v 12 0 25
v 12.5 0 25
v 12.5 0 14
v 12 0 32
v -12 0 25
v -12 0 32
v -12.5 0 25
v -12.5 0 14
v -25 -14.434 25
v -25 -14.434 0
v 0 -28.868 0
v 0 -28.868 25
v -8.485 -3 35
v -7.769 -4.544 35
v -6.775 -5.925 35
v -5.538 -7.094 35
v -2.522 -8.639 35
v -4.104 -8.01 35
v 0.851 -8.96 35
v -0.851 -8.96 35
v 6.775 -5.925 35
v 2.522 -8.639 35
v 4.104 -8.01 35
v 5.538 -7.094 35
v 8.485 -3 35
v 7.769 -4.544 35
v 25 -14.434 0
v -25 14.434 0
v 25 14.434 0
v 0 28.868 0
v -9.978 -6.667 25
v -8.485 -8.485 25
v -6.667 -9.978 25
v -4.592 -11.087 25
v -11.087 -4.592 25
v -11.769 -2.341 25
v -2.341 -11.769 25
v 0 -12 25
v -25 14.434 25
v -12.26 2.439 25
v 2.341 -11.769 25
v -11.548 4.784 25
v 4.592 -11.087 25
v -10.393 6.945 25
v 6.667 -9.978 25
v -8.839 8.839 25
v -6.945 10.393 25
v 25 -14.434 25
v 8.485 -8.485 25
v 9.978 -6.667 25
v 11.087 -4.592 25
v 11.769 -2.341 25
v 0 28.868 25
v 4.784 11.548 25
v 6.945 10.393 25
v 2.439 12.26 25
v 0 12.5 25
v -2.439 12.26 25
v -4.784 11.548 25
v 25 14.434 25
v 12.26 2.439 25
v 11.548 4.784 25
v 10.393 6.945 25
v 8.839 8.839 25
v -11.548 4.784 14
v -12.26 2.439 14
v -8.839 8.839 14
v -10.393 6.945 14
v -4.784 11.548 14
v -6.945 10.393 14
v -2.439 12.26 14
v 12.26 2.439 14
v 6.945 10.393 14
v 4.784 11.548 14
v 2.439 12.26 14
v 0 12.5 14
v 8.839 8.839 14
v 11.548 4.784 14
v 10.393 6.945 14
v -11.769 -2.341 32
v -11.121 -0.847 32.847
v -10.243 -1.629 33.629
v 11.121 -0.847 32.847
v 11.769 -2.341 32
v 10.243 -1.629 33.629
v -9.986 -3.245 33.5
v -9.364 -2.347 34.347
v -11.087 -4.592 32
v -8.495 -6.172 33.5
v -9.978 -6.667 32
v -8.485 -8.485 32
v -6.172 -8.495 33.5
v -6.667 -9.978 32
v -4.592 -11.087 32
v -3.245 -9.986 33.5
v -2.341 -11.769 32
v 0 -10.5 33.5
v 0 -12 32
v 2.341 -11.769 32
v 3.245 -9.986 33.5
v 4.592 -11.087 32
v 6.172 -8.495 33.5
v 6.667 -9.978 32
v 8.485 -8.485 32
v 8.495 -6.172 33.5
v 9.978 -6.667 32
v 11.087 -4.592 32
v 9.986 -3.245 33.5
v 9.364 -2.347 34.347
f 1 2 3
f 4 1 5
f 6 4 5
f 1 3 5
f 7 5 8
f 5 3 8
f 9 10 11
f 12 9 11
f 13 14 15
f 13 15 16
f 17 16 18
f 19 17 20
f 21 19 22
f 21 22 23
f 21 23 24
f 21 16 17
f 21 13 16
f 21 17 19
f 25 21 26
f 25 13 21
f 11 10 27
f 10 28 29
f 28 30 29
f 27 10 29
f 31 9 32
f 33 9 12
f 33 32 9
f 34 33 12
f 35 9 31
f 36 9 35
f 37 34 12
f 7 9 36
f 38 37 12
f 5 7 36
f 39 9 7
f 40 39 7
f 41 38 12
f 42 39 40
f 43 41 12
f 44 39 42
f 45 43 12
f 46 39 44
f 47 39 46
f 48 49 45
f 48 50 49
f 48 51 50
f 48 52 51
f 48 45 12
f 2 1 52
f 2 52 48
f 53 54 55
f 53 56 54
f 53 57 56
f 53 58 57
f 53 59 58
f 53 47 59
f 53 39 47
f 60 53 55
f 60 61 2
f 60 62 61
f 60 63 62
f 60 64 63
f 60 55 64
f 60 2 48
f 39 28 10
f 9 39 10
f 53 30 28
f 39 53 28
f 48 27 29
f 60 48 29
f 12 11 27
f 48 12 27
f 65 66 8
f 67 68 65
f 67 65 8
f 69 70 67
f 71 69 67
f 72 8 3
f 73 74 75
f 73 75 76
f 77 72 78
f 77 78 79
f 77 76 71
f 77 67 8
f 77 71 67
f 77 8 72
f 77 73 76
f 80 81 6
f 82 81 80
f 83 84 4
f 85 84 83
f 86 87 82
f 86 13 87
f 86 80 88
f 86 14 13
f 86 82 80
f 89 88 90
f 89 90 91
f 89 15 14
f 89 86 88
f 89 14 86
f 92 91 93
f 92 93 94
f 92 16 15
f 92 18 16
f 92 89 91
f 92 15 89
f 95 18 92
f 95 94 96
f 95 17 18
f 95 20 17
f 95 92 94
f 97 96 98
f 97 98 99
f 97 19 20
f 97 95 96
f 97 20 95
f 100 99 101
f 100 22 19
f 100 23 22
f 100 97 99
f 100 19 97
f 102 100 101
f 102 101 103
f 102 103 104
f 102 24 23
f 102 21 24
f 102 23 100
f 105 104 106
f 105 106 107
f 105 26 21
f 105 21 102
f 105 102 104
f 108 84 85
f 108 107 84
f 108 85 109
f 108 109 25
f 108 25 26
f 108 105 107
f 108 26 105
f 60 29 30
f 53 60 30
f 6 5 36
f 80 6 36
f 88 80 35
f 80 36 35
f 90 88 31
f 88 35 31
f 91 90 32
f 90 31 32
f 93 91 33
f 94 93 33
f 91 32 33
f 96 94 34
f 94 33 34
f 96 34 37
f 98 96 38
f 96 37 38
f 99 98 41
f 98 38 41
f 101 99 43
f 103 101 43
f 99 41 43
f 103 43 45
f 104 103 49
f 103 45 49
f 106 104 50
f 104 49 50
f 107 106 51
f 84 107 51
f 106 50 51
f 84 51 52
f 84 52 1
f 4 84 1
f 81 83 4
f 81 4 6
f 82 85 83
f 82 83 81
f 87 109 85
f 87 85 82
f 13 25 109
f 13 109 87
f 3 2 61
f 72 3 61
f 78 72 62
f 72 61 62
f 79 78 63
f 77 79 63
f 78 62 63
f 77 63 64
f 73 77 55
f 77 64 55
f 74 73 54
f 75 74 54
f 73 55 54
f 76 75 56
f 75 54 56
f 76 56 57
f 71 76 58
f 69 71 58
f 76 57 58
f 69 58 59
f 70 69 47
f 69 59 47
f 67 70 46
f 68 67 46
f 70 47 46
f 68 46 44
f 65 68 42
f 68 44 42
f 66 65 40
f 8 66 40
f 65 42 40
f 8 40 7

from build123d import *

# Parameters (mm, degrees)
F1_DEPTH = 25
F3_DEPTH = 10
F4_SIZE  = 3
F6_DEPTH = 11


with BuildPart() as f1:
    # F0 (on Top) → F1 (new body)
    with BuildSketch(Plane.XY):
        Polygon((-25, 14.4337567297), (-25, -14.4337567297), (0, -28.8675134595), (25, -14.4337567297), (25, 14.4337567297), (0, 28.8675134595), align=None)
    extrude(amount=F1_DEPTH)

    # F2 (on face) → F3 (join)
    with BuildSketch(Plane.XY.offset(25)):
        with BuildLine():
            ThreePointArc((-12, 0), (0, -12), (12, 0))
            Line((12, 0), (-12, 0))
        make_face()
    extrude(amount=F3_DEPTH)

    # F4
    f4_edges = [f1.edges().sort_by_distance(p)[0] for p in [
        (0, 0, 35),
        (0, -12, 35),
    ]]
    chamfer(f4_edges, length=F4_SIZE)

    # F5 (on face) + F2 (on face) → F6 (cut)
    with BuildSketch(Plane.XY.offset(25)):
        with BuildLine():
            Line((12, 0), (12.5, 0))
            ThreePointArc((12.5, 0), (0, 12.5), (-12.5, 0))
            Line((-12.5, 0), (-12, 0))
            ThreePointArc((-12, 0), (0, 12), (12, 0))
        make_face()
    with BuildSketch(Plane.XY.offset(25)):
        with BuildLine():
            Line((-12, 0), (12, 0))
            ThreePointArc((12, 0), (0, 12), (-12, 0))
        make_face()
    extrude(amount=-F6_DEPTH, mode=Mode.SUBTRACT)


solid = f1.part
